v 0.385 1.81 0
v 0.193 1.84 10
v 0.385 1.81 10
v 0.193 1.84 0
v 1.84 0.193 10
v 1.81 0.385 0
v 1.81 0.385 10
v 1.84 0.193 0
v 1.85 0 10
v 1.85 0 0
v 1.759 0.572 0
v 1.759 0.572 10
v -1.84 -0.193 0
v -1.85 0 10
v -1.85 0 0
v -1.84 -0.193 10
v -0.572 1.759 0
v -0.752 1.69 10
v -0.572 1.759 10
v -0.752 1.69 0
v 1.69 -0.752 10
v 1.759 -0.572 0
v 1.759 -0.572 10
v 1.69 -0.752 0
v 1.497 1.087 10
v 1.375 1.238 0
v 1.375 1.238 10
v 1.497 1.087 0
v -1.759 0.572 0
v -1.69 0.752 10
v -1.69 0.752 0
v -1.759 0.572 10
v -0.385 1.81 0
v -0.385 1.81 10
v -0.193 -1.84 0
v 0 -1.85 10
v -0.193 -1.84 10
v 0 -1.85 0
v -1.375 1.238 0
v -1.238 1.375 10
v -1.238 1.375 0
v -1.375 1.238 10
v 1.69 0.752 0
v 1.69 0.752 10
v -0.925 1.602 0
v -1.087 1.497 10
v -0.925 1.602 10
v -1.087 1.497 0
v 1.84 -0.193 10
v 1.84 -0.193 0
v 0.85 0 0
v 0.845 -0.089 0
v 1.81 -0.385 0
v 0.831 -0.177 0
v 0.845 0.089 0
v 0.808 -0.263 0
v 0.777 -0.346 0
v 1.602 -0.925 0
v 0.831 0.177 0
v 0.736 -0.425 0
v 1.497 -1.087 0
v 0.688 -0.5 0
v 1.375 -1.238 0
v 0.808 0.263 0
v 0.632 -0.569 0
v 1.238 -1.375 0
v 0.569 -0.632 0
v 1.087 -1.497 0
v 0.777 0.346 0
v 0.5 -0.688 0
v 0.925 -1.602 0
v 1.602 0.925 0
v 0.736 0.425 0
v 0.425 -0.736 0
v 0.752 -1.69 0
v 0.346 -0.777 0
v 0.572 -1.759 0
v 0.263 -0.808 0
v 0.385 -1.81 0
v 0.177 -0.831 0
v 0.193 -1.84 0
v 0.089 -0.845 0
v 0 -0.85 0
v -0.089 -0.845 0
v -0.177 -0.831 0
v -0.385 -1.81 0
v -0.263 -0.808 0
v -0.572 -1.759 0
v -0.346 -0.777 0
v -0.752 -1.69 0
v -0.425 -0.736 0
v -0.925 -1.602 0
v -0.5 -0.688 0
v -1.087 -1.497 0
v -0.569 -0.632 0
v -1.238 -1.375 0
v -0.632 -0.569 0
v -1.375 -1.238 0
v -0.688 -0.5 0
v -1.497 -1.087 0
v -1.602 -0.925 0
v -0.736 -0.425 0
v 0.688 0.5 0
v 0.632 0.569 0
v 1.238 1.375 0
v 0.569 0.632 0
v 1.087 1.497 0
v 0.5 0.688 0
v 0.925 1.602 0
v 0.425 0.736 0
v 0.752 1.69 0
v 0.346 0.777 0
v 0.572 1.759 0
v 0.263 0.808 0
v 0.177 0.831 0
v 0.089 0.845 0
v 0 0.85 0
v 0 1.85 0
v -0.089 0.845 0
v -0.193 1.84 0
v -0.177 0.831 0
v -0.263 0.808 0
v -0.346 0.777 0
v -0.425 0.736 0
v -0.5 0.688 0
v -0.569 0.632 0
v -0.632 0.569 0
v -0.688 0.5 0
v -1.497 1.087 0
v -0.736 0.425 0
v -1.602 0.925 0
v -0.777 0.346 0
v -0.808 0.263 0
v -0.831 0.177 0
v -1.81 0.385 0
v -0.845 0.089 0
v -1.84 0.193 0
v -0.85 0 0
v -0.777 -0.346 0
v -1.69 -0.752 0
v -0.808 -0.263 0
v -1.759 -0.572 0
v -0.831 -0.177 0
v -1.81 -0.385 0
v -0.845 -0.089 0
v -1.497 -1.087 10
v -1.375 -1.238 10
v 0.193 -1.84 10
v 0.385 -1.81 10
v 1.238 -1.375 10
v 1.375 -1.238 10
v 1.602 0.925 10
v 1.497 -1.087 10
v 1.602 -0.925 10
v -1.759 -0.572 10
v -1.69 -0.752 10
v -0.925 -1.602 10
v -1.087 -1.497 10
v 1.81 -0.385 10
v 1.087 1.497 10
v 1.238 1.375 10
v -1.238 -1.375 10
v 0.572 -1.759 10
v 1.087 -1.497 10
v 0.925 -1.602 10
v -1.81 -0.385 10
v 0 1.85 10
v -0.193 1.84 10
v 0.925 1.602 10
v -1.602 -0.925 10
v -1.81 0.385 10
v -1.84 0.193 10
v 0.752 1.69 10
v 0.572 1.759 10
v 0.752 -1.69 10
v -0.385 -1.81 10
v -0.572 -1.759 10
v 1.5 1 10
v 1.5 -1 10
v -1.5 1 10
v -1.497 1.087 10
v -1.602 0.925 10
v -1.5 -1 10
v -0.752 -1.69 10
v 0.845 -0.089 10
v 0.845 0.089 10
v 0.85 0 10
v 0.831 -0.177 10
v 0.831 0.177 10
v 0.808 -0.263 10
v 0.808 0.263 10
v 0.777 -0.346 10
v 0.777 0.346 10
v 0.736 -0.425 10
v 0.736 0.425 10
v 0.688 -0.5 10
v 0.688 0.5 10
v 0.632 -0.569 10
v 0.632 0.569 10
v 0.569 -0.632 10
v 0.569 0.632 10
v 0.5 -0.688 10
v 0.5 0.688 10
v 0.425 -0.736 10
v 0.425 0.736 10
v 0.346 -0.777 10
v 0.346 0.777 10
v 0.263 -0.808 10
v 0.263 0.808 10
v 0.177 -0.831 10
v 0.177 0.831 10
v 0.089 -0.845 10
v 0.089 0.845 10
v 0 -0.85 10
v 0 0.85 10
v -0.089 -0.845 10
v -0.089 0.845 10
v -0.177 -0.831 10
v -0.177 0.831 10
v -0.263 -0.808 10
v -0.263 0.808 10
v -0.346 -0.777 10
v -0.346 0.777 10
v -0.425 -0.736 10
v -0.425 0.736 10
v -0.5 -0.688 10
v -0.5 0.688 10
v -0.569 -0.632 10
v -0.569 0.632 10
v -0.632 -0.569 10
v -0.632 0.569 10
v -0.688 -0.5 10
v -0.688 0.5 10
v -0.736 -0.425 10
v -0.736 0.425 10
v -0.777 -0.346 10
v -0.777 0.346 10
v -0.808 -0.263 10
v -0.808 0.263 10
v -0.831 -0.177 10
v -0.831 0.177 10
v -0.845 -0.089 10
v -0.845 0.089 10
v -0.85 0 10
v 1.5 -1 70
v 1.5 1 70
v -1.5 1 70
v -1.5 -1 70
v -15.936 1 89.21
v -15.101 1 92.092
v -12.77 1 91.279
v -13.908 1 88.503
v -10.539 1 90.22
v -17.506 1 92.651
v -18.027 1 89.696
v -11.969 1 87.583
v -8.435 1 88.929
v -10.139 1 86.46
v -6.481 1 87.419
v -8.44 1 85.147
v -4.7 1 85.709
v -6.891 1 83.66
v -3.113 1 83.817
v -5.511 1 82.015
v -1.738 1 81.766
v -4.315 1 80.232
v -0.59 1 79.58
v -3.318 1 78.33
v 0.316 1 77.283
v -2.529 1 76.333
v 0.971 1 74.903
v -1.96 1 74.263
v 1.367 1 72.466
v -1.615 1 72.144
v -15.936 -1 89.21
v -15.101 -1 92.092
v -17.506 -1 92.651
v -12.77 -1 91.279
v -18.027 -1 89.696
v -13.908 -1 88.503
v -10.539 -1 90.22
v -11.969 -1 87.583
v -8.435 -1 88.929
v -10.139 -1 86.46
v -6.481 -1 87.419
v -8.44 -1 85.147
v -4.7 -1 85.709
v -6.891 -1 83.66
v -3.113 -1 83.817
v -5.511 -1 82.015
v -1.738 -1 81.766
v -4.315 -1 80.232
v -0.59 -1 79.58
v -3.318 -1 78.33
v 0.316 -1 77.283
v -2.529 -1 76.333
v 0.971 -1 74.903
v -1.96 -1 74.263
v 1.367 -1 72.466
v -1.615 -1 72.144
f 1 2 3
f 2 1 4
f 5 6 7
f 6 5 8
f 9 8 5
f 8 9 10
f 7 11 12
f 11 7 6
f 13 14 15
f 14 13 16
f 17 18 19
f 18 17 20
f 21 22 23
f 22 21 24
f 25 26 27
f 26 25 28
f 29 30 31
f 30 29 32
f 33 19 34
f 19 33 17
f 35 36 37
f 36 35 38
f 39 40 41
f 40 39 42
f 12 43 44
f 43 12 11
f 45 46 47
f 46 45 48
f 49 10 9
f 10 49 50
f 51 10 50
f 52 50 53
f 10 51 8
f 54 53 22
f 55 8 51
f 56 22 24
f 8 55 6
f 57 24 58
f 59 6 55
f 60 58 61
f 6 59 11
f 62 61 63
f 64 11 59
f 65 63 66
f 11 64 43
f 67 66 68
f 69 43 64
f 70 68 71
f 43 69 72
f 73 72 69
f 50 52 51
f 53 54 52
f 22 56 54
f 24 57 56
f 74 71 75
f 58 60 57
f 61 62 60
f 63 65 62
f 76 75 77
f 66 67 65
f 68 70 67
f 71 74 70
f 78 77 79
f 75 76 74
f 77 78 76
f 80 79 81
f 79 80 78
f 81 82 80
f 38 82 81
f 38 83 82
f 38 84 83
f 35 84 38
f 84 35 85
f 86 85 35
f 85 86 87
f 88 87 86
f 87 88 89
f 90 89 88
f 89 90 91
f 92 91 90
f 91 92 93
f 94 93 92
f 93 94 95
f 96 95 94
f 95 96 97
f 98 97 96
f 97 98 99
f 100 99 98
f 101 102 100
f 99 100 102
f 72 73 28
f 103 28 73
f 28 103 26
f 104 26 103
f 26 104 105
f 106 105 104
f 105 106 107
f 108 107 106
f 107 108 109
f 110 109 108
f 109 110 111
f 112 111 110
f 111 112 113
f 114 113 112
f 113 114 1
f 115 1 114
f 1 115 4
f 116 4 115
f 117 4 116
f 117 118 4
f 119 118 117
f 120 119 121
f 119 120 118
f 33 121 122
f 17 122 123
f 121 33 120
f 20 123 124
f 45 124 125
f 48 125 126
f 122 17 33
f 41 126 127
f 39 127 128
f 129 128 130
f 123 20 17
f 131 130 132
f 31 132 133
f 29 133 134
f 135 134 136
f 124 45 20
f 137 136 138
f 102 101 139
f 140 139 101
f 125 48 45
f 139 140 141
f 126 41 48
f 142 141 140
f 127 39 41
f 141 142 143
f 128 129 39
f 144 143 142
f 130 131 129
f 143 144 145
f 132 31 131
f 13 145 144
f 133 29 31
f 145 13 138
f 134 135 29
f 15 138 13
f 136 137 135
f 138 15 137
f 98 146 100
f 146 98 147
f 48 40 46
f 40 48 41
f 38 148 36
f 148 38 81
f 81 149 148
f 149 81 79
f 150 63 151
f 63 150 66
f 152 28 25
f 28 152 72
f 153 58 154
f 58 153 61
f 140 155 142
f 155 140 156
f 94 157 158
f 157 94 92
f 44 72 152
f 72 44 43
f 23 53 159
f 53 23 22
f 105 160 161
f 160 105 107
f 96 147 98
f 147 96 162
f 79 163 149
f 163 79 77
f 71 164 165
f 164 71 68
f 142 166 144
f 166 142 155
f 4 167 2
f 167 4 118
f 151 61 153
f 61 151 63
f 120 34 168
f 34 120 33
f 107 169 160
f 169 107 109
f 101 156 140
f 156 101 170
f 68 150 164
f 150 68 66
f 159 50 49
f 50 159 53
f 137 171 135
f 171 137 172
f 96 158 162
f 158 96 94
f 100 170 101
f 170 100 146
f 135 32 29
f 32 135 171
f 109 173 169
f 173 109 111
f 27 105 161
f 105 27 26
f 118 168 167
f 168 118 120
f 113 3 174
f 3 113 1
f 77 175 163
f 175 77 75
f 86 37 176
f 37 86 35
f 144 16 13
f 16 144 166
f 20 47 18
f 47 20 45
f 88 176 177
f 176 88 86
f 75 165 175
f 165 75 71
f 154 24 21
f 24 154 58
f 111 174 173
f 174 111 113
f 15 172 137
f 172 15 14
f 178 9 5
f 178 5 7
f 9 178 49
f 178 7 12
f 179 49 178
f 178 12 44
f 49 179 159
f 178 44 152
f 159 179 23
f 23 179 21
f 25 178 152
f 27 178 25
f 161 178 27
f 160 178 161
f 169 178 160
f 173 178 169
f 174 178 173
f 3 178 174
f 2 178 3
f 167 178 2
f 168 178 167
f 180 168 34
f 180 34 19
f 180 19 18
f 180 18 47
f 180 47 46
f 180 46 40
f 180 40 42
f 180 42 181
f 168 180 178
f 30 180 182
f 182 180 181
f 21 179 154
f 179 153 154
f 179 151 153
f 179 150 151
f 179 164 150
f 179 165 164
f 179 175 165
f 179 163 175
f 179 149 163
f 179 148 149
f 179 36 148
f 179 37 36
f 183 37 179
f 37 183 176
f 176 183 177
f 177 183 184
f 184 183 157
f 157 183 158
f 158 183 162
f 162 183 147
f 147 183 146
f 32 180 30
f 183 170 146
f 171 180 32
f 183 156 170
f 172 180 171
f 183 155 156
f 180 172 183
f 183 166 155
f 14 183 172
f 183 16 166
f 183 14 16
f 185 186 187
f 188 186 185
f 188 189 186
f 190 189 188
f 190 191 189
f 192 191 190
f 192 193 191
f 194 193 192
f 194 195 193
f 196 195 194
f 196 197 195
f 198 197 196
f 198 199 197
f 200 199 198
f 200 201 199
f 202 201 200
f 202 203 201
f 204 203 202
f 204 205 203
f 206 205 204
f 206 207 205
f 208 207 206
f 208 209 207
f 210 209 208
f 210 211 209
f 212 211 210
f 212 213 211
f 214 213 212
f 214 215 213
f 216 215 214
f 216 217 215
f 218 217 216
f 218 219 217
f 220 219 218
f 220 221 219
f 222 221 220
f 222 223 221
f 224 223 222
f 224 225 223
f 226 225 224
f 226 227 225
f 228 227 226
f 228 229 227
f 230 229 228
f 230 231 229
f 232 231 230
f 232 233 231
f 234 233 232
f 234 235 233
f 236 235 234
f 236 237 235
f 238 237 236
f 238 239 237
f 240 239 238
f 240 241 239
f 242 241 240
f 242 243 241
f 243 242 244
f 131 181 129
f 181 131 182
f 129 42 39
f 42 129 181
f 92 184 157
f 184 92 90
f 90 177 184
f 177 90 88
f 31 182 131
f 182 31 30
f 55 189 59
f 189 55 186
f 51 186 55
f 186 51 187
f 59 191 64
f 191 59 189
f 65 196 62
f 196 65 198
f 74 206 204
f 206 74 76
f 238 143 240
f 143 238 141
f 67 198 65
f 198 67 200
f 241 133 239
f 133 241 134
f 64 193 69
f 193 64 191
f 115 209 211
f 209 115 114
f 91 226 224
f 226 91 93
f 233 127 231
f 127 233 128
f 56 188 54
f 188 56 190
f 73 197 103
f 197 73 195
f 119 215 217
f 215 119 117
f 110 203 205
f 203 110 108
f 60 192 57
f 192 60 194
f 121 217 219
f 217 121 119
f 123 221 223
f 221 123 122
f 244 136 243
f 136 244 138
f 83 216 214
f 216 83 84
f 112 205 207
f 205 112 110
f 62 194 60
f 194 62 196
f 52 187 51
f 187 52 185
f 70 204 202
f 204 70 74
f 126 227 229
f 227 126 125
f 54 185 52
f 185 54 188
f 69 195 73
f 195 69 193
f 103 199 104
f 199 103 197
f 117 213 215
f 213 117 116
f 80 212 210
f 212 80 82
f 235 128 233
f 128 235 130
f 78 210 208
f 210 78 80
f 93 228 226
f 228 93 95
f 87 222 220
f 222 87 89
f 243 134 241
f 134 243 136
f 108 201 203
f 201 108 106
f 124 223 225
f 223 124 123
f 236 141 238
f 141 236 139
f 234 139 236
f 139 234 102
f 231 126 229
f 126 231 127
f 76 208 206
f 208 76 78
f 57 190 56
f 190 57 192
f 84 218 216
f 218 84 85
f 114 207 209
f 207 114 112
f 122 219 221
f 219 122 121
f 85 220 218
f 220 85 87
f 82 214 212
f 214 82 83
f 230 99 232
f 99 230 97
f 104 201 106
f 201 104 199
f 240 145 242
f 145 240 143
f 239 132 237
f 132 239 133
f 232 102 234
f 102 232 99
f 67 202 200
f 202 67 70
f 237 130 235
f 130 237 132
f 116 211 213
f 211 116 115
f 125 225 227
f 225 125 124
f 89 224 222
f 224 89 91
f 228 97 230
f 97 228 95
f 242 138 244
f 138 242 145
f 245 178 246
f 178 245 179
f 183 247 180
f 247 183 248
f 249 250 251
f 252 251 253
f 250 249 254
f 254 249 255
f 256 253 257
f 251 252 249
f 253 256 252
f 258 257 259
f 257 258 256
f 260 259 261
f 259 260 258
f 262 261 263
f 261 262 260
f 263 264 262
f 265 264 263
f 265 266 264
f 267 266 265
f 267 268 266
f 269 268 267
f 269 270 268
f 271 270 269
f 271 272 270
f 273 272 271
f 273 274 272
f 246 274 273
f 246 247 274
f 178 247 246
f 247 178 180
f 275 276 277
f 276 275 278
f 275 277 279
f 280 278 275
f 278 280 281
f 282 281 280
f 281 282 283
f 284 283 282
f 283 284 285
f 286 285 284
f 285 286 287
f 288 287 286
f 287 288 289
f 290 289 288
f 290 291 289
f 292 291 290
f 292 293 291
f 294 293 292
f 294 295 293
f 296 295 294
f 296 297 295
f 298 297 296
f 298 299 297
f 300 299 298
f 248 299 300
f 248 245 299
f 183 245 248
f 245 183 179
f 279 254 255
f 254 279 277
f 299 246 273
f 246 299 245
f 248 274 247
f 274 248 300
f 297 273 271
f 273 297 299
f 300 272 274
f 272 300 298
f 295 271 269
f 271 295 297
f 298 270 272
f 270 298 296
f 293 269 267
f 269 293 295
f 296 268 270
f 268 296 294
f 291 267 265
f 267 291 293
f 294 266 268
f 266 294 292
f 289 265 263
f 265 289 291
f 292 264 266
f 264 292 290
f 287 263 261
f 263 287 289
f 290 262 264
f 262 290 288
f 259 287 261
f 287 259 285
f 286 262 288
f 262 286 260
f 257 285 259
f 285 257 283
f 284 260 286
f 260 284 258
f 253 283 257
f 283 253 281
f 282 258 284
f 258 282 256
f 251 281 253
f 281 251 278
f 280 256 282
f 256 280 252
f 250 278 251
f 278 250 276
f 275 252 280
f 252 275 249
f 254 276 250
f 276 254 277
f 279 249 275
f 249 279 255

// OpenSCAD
// === Parameters ===

// Stub/sleeve
stub_diameter = 1.7;
sleeve_wall = 1;
sleeve_length = 10;

// Arm (straight + curved)
arm_straight_length = 60;
arm_curve_radius = 20;
arm_curve_angle = 80;
arm_width = 3;
arm_thickness = 2;

// Tip
tip_length = 10;
tip_width = 6;
tip_thickness = 3;

$fn = 60;  // Smoothness

module sleeve() {
    difference() {
        cylinder(h = sleeve_length, d = stub_diameter + 2*sleeve_wall);
        cylinder(h = sleeve_length, d = stub_diameter);
    }
}

module straight_arm() {
    translate([-arm_width/2, -arm_thickness/2, sleeve_length])
        cube([arm_width, arm_thickness, arm_straight_length]);
}

module curved_end() {
    translate([-arm_curve_radius - arm_width / 2.0, 0, sleeve_length + arm_straight_length])
        rotate([90, 0, 0])
            rotate_extrude(angle = arm_curve_angle)
                translate([arm_curve_radius, -arm_thickness/2, 0])
                    square([arm_width, arm_thickness], center=false);
}

module flared_tip() {
    // Place at end of curve
    angle_rad = arm_curve_angle * PI / 180;
    tip_z = sleeve_length + arm_straight_length + arm_curve_radius * sin(angle_rad);
    tip_x = -tip_length + arm_curve_radius * sin(angle_rad); //(1 - cos(angle_rad));
    
    translate([tip_x - tip_width/2, -tip_thickness/2, tip_z])
    rotate([0, -arm_curve_angle, 0])
        cube([tip_width, tip_thickness, tip_length]);
}

module full_earpiece() {
    union() {
        sleeve();
        straight_arm();
        curved_end();
        //flared_tip();
    }
}

full_earpiece();
